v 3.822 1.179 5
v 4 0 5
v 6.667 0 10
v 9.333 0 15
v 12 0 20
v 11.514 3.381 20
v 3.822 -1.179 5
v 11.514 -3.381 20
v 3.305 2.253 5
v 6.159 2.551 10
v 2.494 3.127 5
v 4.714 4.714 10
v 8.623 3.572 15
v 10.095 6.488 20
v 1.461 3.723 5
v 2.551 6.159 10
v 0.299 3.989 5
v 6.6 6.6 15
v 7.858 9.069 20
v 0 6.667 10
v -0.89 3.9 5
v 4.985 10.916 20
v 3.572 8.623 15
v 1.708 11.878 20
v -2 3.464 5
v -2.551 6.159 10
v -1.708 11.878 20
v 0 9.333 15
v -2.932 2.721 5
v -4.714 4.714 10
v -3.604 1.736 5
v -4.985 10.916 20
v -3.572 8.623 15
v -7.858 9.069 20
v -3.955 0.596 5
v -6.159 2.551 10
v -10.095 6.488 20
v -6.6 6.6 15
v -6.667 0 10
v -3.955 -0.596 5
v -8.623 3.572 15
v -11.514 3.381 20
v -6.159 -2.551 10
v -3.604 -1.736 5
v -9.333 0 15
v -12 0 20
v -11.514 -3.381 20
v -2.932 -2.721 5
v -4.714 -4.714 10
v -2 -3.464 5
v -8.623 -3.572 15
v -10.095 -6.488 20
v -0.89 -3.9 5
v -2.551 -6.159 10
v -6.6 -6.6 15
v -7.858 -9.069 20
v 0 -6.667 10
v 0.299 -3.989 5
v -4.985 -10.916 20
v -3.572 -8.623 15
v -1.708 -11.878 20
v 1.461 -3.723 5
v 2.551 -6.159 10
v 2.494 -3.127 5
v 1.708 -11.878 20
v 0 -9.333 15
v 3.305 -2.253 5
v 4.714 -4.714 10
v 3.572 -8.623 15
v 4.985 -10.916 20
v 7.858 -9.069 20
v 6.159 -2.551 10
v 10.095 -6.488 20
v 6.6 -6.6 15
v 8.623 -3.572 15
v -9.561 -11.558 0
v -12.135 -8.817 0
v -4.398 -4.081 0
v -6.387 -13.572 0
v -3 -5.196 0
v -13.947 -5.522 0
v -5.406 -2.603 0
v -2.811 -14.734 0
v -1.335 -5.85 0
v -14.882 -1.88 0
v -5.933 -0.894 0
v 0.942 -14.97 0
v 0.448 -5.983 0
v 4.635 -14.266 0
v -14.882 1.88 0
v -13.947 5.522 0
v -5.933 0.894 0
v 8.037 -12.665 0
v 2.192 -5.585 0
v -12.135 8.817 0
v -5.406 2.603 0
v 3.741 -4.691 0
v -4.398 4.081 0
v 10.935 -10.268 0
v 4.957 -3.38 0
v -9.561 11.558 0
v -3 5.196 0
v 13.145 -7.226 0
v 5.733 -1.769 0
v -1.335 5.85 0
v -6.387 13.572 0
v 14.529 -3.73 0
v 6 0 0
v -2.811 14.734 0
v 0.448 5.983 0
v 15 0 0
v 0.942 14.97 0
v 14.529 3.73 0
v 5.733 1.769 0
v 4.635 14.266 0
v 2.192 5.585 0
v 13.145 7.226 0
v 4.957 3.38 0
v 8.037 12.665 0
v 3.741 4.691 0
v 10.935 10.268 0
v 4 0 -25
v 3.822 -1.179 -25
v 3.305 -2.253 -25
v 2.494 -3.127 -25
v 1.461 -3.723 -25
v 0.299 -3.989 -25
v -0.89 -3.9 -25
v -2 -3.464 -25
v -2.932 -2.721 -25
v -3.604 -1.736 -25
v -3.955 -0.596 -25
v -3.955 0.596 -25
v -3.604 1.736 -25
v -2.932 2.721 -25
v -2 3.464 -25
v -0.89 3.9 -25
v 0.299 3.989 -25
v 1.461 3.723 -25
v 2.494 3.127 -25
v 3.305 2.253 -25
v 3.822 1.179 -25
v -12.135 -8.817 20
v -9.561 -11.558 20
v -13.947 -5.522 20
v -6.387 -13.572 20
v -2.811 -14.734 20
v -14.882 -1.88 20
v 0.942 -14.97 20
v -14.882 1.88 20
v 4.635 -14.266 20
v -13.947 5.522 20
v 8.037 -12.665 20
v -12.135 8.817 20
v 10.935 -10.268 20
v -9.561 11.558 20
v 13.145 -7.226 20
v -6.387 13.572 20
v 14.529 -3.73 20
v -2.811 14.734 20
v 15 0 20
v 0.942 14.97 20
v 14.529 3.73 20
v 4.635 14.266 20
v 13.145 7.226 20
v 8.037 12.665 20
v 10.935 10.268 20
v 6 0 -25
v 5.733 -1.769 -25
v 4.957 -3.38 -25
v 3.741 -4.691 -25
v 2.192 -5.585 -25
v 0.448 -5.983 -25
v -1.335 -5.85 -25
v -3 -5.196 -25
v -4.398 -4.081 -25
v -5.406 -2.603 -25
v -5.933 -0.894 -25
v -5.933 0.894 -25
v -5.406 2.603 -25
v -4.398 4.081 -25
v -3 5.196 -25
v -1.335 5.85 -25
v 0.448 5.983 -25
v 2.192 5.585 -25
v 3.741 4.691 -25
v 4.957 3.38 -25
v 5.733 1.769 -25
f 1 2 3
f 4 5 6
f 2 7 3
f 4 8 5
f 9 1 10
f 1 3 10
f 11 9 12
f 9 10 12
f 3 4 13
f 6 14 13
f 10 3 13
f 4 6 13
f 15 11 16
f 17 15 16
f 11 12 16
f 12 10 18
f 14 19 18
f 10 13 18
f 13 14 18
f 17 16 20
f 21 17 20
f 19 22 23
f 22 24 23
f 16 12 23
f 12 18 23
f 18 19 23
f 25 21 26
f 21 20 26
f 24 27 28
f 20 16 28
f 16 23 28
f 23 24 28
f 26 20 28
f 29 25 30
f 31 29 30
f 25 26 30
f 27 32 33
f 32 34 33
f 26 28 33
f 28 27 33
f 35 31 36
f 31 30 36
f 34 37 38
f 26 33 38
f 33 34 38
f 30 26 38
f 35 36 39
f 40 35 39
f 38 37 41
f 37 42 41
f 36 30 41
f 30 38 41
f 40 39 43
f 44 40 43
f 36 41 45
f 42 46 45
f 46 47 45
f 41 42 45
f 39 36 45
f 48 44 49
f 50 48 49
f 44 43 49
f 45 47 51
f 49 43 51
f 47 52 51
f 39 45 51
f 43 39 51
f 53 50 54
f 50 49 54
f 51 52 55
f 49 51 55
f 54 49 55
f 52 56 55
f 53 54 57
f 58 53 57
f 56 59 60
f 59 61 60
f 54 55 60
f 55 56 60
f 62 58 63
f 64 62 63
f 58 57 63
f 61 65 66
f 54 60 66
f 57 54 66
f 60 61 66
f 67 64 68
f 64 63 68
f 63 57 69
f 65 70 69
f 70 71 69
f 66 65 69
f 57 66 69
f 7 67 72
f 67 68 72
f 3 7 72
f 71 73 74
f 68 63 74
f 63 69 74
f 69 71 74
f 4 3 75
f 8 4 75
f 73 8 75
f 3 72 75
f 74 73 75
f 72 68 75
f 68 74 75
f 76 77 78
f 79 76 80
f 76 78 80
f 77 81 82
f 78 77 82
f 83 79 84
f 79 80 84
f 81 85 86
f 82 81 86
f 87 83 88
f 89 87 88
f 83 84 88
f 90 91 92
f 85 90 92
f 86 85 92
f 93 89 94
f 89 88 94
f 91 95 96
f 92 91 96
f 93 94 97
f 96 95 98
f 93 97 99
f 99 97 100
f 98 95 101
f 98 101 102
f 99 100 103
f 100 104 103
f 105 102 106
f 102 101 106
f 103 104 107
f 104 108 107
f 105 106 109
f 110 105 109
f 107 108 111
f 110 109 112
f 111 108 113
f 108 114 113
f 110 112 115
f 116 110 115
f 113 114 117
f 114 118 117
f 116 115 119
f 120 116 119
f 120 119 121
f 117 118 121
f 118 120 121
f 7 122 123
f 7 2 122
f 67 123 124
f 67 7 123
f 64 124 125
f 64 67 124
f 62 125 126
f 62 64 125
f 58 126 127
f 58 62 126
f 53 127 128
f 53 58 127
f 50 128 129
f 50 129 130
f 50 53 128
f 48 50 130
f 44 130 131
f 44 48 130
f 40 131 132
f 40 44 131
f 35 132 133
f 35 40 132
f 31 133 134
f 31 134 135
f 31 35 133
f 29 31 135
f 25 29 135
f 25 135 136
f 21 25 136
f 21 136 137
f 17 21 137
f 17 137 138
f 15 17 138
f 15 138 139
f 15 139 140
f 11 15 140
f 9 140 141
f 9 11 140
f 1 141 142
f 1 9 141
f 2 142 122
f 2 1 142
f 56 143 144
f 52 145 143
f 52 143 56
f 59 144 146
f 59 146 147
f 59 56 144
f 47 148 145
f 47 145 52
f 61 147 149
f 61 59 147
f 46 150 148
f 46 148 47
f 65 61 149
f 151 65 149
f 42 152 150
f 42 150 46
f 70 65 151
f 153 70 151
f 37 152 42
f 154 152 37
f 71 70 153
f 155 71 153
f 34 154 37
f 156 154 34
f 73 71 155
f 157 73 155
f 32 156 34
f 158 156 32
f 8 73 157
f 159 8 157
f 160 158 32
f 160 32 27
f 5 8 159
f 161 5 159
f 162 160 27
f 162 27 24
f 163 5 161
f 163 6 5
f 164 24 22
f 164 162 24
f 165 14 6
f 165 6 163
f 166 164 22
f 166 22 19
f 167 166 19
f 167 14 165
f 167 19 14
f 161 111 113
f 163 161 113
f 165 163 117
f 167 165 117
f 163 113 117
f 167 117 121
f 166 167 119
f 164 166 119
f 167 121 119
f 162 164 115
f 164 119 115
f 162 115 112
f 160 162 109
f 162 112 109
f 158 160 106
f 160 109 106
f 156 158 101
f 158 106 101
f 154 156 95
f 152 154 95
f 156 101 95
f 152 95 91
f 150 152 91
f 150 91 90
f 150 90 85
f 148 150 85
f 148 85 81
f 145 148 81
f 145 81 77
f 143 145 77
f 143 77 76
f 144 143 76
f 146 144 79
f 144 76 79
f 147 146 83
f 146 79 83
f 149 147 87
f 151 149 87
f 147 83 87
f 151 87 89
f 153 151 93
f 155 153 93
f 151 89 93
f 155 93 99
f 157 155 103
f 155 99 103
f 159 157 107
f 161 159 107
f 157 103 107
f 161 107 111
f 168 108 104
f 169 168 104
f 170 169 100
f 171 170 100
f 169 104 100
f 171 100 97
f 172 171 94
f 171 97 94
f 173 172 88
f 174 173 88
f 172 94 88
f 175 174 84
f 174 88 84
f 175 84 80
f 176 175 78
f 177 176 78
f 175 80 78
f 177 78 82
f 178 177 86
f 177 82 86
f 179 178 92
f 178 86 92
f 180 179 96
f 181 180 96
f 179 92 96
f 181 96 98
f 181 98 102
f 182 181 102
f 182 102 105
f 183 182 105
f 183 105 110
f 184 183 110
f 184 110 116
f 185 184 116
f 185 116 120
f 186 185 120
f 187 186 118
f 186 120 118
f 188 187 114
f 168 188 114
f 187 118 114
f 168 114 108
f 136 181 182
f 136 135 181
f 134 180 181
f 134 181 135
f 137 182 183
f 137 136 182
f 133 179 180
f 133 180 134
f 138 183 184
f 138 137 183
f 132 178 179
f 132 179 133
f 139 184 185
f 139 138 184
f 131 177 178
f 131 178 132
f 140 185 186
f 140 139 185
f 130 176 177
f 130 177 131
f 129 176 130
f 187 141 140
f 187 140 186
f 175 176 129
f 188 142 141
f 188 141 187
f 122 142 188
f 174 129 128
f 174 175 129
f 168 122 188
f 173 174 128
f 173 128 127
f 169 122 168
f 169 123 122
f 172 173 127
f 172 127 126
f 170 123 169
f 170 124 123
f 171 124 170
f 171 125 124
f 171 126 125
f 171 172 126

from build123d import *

# Parameters (mm, degrees)
F0_R     = 15
F0_R_2   = 4
F1_DEPTH = 20
F2_SIZE2 = 8
F2_SIZE  = 15
F3_R     = 6
F3_R_2   = 4
F4_DEPTH = 25


with BuildPart() as f1:
    # F0 (on Top) → F1 (new body)
    with BuildSketch(Plane.XY):
        Circle(F0_R)
        Circle(F0_R_2, mode=Mode.SUBTRACT)
    extrude(amount=F1_DEPTH)

    # F2
    f2_edges = [f1.edges().sort_by_distance(p)[0] for p in [
        (-4, 0, 20),
    ]]
    chamfer(f2_edges, length=F2_SIZE, length2=F2_SIZE2)

    # F3 (on face) → F4 (join)
    with BuildSketch(Plane(origin=(0, 0, 0), x_dir=(1, 0, 0), z_dir=(0, 0, -1))):
        Circle(F3_R)
        Circle(F3_R_2, mode=Mode.SUBTRACT)
    extrude(amount=F4_DEPTH)


solid = f1.part
